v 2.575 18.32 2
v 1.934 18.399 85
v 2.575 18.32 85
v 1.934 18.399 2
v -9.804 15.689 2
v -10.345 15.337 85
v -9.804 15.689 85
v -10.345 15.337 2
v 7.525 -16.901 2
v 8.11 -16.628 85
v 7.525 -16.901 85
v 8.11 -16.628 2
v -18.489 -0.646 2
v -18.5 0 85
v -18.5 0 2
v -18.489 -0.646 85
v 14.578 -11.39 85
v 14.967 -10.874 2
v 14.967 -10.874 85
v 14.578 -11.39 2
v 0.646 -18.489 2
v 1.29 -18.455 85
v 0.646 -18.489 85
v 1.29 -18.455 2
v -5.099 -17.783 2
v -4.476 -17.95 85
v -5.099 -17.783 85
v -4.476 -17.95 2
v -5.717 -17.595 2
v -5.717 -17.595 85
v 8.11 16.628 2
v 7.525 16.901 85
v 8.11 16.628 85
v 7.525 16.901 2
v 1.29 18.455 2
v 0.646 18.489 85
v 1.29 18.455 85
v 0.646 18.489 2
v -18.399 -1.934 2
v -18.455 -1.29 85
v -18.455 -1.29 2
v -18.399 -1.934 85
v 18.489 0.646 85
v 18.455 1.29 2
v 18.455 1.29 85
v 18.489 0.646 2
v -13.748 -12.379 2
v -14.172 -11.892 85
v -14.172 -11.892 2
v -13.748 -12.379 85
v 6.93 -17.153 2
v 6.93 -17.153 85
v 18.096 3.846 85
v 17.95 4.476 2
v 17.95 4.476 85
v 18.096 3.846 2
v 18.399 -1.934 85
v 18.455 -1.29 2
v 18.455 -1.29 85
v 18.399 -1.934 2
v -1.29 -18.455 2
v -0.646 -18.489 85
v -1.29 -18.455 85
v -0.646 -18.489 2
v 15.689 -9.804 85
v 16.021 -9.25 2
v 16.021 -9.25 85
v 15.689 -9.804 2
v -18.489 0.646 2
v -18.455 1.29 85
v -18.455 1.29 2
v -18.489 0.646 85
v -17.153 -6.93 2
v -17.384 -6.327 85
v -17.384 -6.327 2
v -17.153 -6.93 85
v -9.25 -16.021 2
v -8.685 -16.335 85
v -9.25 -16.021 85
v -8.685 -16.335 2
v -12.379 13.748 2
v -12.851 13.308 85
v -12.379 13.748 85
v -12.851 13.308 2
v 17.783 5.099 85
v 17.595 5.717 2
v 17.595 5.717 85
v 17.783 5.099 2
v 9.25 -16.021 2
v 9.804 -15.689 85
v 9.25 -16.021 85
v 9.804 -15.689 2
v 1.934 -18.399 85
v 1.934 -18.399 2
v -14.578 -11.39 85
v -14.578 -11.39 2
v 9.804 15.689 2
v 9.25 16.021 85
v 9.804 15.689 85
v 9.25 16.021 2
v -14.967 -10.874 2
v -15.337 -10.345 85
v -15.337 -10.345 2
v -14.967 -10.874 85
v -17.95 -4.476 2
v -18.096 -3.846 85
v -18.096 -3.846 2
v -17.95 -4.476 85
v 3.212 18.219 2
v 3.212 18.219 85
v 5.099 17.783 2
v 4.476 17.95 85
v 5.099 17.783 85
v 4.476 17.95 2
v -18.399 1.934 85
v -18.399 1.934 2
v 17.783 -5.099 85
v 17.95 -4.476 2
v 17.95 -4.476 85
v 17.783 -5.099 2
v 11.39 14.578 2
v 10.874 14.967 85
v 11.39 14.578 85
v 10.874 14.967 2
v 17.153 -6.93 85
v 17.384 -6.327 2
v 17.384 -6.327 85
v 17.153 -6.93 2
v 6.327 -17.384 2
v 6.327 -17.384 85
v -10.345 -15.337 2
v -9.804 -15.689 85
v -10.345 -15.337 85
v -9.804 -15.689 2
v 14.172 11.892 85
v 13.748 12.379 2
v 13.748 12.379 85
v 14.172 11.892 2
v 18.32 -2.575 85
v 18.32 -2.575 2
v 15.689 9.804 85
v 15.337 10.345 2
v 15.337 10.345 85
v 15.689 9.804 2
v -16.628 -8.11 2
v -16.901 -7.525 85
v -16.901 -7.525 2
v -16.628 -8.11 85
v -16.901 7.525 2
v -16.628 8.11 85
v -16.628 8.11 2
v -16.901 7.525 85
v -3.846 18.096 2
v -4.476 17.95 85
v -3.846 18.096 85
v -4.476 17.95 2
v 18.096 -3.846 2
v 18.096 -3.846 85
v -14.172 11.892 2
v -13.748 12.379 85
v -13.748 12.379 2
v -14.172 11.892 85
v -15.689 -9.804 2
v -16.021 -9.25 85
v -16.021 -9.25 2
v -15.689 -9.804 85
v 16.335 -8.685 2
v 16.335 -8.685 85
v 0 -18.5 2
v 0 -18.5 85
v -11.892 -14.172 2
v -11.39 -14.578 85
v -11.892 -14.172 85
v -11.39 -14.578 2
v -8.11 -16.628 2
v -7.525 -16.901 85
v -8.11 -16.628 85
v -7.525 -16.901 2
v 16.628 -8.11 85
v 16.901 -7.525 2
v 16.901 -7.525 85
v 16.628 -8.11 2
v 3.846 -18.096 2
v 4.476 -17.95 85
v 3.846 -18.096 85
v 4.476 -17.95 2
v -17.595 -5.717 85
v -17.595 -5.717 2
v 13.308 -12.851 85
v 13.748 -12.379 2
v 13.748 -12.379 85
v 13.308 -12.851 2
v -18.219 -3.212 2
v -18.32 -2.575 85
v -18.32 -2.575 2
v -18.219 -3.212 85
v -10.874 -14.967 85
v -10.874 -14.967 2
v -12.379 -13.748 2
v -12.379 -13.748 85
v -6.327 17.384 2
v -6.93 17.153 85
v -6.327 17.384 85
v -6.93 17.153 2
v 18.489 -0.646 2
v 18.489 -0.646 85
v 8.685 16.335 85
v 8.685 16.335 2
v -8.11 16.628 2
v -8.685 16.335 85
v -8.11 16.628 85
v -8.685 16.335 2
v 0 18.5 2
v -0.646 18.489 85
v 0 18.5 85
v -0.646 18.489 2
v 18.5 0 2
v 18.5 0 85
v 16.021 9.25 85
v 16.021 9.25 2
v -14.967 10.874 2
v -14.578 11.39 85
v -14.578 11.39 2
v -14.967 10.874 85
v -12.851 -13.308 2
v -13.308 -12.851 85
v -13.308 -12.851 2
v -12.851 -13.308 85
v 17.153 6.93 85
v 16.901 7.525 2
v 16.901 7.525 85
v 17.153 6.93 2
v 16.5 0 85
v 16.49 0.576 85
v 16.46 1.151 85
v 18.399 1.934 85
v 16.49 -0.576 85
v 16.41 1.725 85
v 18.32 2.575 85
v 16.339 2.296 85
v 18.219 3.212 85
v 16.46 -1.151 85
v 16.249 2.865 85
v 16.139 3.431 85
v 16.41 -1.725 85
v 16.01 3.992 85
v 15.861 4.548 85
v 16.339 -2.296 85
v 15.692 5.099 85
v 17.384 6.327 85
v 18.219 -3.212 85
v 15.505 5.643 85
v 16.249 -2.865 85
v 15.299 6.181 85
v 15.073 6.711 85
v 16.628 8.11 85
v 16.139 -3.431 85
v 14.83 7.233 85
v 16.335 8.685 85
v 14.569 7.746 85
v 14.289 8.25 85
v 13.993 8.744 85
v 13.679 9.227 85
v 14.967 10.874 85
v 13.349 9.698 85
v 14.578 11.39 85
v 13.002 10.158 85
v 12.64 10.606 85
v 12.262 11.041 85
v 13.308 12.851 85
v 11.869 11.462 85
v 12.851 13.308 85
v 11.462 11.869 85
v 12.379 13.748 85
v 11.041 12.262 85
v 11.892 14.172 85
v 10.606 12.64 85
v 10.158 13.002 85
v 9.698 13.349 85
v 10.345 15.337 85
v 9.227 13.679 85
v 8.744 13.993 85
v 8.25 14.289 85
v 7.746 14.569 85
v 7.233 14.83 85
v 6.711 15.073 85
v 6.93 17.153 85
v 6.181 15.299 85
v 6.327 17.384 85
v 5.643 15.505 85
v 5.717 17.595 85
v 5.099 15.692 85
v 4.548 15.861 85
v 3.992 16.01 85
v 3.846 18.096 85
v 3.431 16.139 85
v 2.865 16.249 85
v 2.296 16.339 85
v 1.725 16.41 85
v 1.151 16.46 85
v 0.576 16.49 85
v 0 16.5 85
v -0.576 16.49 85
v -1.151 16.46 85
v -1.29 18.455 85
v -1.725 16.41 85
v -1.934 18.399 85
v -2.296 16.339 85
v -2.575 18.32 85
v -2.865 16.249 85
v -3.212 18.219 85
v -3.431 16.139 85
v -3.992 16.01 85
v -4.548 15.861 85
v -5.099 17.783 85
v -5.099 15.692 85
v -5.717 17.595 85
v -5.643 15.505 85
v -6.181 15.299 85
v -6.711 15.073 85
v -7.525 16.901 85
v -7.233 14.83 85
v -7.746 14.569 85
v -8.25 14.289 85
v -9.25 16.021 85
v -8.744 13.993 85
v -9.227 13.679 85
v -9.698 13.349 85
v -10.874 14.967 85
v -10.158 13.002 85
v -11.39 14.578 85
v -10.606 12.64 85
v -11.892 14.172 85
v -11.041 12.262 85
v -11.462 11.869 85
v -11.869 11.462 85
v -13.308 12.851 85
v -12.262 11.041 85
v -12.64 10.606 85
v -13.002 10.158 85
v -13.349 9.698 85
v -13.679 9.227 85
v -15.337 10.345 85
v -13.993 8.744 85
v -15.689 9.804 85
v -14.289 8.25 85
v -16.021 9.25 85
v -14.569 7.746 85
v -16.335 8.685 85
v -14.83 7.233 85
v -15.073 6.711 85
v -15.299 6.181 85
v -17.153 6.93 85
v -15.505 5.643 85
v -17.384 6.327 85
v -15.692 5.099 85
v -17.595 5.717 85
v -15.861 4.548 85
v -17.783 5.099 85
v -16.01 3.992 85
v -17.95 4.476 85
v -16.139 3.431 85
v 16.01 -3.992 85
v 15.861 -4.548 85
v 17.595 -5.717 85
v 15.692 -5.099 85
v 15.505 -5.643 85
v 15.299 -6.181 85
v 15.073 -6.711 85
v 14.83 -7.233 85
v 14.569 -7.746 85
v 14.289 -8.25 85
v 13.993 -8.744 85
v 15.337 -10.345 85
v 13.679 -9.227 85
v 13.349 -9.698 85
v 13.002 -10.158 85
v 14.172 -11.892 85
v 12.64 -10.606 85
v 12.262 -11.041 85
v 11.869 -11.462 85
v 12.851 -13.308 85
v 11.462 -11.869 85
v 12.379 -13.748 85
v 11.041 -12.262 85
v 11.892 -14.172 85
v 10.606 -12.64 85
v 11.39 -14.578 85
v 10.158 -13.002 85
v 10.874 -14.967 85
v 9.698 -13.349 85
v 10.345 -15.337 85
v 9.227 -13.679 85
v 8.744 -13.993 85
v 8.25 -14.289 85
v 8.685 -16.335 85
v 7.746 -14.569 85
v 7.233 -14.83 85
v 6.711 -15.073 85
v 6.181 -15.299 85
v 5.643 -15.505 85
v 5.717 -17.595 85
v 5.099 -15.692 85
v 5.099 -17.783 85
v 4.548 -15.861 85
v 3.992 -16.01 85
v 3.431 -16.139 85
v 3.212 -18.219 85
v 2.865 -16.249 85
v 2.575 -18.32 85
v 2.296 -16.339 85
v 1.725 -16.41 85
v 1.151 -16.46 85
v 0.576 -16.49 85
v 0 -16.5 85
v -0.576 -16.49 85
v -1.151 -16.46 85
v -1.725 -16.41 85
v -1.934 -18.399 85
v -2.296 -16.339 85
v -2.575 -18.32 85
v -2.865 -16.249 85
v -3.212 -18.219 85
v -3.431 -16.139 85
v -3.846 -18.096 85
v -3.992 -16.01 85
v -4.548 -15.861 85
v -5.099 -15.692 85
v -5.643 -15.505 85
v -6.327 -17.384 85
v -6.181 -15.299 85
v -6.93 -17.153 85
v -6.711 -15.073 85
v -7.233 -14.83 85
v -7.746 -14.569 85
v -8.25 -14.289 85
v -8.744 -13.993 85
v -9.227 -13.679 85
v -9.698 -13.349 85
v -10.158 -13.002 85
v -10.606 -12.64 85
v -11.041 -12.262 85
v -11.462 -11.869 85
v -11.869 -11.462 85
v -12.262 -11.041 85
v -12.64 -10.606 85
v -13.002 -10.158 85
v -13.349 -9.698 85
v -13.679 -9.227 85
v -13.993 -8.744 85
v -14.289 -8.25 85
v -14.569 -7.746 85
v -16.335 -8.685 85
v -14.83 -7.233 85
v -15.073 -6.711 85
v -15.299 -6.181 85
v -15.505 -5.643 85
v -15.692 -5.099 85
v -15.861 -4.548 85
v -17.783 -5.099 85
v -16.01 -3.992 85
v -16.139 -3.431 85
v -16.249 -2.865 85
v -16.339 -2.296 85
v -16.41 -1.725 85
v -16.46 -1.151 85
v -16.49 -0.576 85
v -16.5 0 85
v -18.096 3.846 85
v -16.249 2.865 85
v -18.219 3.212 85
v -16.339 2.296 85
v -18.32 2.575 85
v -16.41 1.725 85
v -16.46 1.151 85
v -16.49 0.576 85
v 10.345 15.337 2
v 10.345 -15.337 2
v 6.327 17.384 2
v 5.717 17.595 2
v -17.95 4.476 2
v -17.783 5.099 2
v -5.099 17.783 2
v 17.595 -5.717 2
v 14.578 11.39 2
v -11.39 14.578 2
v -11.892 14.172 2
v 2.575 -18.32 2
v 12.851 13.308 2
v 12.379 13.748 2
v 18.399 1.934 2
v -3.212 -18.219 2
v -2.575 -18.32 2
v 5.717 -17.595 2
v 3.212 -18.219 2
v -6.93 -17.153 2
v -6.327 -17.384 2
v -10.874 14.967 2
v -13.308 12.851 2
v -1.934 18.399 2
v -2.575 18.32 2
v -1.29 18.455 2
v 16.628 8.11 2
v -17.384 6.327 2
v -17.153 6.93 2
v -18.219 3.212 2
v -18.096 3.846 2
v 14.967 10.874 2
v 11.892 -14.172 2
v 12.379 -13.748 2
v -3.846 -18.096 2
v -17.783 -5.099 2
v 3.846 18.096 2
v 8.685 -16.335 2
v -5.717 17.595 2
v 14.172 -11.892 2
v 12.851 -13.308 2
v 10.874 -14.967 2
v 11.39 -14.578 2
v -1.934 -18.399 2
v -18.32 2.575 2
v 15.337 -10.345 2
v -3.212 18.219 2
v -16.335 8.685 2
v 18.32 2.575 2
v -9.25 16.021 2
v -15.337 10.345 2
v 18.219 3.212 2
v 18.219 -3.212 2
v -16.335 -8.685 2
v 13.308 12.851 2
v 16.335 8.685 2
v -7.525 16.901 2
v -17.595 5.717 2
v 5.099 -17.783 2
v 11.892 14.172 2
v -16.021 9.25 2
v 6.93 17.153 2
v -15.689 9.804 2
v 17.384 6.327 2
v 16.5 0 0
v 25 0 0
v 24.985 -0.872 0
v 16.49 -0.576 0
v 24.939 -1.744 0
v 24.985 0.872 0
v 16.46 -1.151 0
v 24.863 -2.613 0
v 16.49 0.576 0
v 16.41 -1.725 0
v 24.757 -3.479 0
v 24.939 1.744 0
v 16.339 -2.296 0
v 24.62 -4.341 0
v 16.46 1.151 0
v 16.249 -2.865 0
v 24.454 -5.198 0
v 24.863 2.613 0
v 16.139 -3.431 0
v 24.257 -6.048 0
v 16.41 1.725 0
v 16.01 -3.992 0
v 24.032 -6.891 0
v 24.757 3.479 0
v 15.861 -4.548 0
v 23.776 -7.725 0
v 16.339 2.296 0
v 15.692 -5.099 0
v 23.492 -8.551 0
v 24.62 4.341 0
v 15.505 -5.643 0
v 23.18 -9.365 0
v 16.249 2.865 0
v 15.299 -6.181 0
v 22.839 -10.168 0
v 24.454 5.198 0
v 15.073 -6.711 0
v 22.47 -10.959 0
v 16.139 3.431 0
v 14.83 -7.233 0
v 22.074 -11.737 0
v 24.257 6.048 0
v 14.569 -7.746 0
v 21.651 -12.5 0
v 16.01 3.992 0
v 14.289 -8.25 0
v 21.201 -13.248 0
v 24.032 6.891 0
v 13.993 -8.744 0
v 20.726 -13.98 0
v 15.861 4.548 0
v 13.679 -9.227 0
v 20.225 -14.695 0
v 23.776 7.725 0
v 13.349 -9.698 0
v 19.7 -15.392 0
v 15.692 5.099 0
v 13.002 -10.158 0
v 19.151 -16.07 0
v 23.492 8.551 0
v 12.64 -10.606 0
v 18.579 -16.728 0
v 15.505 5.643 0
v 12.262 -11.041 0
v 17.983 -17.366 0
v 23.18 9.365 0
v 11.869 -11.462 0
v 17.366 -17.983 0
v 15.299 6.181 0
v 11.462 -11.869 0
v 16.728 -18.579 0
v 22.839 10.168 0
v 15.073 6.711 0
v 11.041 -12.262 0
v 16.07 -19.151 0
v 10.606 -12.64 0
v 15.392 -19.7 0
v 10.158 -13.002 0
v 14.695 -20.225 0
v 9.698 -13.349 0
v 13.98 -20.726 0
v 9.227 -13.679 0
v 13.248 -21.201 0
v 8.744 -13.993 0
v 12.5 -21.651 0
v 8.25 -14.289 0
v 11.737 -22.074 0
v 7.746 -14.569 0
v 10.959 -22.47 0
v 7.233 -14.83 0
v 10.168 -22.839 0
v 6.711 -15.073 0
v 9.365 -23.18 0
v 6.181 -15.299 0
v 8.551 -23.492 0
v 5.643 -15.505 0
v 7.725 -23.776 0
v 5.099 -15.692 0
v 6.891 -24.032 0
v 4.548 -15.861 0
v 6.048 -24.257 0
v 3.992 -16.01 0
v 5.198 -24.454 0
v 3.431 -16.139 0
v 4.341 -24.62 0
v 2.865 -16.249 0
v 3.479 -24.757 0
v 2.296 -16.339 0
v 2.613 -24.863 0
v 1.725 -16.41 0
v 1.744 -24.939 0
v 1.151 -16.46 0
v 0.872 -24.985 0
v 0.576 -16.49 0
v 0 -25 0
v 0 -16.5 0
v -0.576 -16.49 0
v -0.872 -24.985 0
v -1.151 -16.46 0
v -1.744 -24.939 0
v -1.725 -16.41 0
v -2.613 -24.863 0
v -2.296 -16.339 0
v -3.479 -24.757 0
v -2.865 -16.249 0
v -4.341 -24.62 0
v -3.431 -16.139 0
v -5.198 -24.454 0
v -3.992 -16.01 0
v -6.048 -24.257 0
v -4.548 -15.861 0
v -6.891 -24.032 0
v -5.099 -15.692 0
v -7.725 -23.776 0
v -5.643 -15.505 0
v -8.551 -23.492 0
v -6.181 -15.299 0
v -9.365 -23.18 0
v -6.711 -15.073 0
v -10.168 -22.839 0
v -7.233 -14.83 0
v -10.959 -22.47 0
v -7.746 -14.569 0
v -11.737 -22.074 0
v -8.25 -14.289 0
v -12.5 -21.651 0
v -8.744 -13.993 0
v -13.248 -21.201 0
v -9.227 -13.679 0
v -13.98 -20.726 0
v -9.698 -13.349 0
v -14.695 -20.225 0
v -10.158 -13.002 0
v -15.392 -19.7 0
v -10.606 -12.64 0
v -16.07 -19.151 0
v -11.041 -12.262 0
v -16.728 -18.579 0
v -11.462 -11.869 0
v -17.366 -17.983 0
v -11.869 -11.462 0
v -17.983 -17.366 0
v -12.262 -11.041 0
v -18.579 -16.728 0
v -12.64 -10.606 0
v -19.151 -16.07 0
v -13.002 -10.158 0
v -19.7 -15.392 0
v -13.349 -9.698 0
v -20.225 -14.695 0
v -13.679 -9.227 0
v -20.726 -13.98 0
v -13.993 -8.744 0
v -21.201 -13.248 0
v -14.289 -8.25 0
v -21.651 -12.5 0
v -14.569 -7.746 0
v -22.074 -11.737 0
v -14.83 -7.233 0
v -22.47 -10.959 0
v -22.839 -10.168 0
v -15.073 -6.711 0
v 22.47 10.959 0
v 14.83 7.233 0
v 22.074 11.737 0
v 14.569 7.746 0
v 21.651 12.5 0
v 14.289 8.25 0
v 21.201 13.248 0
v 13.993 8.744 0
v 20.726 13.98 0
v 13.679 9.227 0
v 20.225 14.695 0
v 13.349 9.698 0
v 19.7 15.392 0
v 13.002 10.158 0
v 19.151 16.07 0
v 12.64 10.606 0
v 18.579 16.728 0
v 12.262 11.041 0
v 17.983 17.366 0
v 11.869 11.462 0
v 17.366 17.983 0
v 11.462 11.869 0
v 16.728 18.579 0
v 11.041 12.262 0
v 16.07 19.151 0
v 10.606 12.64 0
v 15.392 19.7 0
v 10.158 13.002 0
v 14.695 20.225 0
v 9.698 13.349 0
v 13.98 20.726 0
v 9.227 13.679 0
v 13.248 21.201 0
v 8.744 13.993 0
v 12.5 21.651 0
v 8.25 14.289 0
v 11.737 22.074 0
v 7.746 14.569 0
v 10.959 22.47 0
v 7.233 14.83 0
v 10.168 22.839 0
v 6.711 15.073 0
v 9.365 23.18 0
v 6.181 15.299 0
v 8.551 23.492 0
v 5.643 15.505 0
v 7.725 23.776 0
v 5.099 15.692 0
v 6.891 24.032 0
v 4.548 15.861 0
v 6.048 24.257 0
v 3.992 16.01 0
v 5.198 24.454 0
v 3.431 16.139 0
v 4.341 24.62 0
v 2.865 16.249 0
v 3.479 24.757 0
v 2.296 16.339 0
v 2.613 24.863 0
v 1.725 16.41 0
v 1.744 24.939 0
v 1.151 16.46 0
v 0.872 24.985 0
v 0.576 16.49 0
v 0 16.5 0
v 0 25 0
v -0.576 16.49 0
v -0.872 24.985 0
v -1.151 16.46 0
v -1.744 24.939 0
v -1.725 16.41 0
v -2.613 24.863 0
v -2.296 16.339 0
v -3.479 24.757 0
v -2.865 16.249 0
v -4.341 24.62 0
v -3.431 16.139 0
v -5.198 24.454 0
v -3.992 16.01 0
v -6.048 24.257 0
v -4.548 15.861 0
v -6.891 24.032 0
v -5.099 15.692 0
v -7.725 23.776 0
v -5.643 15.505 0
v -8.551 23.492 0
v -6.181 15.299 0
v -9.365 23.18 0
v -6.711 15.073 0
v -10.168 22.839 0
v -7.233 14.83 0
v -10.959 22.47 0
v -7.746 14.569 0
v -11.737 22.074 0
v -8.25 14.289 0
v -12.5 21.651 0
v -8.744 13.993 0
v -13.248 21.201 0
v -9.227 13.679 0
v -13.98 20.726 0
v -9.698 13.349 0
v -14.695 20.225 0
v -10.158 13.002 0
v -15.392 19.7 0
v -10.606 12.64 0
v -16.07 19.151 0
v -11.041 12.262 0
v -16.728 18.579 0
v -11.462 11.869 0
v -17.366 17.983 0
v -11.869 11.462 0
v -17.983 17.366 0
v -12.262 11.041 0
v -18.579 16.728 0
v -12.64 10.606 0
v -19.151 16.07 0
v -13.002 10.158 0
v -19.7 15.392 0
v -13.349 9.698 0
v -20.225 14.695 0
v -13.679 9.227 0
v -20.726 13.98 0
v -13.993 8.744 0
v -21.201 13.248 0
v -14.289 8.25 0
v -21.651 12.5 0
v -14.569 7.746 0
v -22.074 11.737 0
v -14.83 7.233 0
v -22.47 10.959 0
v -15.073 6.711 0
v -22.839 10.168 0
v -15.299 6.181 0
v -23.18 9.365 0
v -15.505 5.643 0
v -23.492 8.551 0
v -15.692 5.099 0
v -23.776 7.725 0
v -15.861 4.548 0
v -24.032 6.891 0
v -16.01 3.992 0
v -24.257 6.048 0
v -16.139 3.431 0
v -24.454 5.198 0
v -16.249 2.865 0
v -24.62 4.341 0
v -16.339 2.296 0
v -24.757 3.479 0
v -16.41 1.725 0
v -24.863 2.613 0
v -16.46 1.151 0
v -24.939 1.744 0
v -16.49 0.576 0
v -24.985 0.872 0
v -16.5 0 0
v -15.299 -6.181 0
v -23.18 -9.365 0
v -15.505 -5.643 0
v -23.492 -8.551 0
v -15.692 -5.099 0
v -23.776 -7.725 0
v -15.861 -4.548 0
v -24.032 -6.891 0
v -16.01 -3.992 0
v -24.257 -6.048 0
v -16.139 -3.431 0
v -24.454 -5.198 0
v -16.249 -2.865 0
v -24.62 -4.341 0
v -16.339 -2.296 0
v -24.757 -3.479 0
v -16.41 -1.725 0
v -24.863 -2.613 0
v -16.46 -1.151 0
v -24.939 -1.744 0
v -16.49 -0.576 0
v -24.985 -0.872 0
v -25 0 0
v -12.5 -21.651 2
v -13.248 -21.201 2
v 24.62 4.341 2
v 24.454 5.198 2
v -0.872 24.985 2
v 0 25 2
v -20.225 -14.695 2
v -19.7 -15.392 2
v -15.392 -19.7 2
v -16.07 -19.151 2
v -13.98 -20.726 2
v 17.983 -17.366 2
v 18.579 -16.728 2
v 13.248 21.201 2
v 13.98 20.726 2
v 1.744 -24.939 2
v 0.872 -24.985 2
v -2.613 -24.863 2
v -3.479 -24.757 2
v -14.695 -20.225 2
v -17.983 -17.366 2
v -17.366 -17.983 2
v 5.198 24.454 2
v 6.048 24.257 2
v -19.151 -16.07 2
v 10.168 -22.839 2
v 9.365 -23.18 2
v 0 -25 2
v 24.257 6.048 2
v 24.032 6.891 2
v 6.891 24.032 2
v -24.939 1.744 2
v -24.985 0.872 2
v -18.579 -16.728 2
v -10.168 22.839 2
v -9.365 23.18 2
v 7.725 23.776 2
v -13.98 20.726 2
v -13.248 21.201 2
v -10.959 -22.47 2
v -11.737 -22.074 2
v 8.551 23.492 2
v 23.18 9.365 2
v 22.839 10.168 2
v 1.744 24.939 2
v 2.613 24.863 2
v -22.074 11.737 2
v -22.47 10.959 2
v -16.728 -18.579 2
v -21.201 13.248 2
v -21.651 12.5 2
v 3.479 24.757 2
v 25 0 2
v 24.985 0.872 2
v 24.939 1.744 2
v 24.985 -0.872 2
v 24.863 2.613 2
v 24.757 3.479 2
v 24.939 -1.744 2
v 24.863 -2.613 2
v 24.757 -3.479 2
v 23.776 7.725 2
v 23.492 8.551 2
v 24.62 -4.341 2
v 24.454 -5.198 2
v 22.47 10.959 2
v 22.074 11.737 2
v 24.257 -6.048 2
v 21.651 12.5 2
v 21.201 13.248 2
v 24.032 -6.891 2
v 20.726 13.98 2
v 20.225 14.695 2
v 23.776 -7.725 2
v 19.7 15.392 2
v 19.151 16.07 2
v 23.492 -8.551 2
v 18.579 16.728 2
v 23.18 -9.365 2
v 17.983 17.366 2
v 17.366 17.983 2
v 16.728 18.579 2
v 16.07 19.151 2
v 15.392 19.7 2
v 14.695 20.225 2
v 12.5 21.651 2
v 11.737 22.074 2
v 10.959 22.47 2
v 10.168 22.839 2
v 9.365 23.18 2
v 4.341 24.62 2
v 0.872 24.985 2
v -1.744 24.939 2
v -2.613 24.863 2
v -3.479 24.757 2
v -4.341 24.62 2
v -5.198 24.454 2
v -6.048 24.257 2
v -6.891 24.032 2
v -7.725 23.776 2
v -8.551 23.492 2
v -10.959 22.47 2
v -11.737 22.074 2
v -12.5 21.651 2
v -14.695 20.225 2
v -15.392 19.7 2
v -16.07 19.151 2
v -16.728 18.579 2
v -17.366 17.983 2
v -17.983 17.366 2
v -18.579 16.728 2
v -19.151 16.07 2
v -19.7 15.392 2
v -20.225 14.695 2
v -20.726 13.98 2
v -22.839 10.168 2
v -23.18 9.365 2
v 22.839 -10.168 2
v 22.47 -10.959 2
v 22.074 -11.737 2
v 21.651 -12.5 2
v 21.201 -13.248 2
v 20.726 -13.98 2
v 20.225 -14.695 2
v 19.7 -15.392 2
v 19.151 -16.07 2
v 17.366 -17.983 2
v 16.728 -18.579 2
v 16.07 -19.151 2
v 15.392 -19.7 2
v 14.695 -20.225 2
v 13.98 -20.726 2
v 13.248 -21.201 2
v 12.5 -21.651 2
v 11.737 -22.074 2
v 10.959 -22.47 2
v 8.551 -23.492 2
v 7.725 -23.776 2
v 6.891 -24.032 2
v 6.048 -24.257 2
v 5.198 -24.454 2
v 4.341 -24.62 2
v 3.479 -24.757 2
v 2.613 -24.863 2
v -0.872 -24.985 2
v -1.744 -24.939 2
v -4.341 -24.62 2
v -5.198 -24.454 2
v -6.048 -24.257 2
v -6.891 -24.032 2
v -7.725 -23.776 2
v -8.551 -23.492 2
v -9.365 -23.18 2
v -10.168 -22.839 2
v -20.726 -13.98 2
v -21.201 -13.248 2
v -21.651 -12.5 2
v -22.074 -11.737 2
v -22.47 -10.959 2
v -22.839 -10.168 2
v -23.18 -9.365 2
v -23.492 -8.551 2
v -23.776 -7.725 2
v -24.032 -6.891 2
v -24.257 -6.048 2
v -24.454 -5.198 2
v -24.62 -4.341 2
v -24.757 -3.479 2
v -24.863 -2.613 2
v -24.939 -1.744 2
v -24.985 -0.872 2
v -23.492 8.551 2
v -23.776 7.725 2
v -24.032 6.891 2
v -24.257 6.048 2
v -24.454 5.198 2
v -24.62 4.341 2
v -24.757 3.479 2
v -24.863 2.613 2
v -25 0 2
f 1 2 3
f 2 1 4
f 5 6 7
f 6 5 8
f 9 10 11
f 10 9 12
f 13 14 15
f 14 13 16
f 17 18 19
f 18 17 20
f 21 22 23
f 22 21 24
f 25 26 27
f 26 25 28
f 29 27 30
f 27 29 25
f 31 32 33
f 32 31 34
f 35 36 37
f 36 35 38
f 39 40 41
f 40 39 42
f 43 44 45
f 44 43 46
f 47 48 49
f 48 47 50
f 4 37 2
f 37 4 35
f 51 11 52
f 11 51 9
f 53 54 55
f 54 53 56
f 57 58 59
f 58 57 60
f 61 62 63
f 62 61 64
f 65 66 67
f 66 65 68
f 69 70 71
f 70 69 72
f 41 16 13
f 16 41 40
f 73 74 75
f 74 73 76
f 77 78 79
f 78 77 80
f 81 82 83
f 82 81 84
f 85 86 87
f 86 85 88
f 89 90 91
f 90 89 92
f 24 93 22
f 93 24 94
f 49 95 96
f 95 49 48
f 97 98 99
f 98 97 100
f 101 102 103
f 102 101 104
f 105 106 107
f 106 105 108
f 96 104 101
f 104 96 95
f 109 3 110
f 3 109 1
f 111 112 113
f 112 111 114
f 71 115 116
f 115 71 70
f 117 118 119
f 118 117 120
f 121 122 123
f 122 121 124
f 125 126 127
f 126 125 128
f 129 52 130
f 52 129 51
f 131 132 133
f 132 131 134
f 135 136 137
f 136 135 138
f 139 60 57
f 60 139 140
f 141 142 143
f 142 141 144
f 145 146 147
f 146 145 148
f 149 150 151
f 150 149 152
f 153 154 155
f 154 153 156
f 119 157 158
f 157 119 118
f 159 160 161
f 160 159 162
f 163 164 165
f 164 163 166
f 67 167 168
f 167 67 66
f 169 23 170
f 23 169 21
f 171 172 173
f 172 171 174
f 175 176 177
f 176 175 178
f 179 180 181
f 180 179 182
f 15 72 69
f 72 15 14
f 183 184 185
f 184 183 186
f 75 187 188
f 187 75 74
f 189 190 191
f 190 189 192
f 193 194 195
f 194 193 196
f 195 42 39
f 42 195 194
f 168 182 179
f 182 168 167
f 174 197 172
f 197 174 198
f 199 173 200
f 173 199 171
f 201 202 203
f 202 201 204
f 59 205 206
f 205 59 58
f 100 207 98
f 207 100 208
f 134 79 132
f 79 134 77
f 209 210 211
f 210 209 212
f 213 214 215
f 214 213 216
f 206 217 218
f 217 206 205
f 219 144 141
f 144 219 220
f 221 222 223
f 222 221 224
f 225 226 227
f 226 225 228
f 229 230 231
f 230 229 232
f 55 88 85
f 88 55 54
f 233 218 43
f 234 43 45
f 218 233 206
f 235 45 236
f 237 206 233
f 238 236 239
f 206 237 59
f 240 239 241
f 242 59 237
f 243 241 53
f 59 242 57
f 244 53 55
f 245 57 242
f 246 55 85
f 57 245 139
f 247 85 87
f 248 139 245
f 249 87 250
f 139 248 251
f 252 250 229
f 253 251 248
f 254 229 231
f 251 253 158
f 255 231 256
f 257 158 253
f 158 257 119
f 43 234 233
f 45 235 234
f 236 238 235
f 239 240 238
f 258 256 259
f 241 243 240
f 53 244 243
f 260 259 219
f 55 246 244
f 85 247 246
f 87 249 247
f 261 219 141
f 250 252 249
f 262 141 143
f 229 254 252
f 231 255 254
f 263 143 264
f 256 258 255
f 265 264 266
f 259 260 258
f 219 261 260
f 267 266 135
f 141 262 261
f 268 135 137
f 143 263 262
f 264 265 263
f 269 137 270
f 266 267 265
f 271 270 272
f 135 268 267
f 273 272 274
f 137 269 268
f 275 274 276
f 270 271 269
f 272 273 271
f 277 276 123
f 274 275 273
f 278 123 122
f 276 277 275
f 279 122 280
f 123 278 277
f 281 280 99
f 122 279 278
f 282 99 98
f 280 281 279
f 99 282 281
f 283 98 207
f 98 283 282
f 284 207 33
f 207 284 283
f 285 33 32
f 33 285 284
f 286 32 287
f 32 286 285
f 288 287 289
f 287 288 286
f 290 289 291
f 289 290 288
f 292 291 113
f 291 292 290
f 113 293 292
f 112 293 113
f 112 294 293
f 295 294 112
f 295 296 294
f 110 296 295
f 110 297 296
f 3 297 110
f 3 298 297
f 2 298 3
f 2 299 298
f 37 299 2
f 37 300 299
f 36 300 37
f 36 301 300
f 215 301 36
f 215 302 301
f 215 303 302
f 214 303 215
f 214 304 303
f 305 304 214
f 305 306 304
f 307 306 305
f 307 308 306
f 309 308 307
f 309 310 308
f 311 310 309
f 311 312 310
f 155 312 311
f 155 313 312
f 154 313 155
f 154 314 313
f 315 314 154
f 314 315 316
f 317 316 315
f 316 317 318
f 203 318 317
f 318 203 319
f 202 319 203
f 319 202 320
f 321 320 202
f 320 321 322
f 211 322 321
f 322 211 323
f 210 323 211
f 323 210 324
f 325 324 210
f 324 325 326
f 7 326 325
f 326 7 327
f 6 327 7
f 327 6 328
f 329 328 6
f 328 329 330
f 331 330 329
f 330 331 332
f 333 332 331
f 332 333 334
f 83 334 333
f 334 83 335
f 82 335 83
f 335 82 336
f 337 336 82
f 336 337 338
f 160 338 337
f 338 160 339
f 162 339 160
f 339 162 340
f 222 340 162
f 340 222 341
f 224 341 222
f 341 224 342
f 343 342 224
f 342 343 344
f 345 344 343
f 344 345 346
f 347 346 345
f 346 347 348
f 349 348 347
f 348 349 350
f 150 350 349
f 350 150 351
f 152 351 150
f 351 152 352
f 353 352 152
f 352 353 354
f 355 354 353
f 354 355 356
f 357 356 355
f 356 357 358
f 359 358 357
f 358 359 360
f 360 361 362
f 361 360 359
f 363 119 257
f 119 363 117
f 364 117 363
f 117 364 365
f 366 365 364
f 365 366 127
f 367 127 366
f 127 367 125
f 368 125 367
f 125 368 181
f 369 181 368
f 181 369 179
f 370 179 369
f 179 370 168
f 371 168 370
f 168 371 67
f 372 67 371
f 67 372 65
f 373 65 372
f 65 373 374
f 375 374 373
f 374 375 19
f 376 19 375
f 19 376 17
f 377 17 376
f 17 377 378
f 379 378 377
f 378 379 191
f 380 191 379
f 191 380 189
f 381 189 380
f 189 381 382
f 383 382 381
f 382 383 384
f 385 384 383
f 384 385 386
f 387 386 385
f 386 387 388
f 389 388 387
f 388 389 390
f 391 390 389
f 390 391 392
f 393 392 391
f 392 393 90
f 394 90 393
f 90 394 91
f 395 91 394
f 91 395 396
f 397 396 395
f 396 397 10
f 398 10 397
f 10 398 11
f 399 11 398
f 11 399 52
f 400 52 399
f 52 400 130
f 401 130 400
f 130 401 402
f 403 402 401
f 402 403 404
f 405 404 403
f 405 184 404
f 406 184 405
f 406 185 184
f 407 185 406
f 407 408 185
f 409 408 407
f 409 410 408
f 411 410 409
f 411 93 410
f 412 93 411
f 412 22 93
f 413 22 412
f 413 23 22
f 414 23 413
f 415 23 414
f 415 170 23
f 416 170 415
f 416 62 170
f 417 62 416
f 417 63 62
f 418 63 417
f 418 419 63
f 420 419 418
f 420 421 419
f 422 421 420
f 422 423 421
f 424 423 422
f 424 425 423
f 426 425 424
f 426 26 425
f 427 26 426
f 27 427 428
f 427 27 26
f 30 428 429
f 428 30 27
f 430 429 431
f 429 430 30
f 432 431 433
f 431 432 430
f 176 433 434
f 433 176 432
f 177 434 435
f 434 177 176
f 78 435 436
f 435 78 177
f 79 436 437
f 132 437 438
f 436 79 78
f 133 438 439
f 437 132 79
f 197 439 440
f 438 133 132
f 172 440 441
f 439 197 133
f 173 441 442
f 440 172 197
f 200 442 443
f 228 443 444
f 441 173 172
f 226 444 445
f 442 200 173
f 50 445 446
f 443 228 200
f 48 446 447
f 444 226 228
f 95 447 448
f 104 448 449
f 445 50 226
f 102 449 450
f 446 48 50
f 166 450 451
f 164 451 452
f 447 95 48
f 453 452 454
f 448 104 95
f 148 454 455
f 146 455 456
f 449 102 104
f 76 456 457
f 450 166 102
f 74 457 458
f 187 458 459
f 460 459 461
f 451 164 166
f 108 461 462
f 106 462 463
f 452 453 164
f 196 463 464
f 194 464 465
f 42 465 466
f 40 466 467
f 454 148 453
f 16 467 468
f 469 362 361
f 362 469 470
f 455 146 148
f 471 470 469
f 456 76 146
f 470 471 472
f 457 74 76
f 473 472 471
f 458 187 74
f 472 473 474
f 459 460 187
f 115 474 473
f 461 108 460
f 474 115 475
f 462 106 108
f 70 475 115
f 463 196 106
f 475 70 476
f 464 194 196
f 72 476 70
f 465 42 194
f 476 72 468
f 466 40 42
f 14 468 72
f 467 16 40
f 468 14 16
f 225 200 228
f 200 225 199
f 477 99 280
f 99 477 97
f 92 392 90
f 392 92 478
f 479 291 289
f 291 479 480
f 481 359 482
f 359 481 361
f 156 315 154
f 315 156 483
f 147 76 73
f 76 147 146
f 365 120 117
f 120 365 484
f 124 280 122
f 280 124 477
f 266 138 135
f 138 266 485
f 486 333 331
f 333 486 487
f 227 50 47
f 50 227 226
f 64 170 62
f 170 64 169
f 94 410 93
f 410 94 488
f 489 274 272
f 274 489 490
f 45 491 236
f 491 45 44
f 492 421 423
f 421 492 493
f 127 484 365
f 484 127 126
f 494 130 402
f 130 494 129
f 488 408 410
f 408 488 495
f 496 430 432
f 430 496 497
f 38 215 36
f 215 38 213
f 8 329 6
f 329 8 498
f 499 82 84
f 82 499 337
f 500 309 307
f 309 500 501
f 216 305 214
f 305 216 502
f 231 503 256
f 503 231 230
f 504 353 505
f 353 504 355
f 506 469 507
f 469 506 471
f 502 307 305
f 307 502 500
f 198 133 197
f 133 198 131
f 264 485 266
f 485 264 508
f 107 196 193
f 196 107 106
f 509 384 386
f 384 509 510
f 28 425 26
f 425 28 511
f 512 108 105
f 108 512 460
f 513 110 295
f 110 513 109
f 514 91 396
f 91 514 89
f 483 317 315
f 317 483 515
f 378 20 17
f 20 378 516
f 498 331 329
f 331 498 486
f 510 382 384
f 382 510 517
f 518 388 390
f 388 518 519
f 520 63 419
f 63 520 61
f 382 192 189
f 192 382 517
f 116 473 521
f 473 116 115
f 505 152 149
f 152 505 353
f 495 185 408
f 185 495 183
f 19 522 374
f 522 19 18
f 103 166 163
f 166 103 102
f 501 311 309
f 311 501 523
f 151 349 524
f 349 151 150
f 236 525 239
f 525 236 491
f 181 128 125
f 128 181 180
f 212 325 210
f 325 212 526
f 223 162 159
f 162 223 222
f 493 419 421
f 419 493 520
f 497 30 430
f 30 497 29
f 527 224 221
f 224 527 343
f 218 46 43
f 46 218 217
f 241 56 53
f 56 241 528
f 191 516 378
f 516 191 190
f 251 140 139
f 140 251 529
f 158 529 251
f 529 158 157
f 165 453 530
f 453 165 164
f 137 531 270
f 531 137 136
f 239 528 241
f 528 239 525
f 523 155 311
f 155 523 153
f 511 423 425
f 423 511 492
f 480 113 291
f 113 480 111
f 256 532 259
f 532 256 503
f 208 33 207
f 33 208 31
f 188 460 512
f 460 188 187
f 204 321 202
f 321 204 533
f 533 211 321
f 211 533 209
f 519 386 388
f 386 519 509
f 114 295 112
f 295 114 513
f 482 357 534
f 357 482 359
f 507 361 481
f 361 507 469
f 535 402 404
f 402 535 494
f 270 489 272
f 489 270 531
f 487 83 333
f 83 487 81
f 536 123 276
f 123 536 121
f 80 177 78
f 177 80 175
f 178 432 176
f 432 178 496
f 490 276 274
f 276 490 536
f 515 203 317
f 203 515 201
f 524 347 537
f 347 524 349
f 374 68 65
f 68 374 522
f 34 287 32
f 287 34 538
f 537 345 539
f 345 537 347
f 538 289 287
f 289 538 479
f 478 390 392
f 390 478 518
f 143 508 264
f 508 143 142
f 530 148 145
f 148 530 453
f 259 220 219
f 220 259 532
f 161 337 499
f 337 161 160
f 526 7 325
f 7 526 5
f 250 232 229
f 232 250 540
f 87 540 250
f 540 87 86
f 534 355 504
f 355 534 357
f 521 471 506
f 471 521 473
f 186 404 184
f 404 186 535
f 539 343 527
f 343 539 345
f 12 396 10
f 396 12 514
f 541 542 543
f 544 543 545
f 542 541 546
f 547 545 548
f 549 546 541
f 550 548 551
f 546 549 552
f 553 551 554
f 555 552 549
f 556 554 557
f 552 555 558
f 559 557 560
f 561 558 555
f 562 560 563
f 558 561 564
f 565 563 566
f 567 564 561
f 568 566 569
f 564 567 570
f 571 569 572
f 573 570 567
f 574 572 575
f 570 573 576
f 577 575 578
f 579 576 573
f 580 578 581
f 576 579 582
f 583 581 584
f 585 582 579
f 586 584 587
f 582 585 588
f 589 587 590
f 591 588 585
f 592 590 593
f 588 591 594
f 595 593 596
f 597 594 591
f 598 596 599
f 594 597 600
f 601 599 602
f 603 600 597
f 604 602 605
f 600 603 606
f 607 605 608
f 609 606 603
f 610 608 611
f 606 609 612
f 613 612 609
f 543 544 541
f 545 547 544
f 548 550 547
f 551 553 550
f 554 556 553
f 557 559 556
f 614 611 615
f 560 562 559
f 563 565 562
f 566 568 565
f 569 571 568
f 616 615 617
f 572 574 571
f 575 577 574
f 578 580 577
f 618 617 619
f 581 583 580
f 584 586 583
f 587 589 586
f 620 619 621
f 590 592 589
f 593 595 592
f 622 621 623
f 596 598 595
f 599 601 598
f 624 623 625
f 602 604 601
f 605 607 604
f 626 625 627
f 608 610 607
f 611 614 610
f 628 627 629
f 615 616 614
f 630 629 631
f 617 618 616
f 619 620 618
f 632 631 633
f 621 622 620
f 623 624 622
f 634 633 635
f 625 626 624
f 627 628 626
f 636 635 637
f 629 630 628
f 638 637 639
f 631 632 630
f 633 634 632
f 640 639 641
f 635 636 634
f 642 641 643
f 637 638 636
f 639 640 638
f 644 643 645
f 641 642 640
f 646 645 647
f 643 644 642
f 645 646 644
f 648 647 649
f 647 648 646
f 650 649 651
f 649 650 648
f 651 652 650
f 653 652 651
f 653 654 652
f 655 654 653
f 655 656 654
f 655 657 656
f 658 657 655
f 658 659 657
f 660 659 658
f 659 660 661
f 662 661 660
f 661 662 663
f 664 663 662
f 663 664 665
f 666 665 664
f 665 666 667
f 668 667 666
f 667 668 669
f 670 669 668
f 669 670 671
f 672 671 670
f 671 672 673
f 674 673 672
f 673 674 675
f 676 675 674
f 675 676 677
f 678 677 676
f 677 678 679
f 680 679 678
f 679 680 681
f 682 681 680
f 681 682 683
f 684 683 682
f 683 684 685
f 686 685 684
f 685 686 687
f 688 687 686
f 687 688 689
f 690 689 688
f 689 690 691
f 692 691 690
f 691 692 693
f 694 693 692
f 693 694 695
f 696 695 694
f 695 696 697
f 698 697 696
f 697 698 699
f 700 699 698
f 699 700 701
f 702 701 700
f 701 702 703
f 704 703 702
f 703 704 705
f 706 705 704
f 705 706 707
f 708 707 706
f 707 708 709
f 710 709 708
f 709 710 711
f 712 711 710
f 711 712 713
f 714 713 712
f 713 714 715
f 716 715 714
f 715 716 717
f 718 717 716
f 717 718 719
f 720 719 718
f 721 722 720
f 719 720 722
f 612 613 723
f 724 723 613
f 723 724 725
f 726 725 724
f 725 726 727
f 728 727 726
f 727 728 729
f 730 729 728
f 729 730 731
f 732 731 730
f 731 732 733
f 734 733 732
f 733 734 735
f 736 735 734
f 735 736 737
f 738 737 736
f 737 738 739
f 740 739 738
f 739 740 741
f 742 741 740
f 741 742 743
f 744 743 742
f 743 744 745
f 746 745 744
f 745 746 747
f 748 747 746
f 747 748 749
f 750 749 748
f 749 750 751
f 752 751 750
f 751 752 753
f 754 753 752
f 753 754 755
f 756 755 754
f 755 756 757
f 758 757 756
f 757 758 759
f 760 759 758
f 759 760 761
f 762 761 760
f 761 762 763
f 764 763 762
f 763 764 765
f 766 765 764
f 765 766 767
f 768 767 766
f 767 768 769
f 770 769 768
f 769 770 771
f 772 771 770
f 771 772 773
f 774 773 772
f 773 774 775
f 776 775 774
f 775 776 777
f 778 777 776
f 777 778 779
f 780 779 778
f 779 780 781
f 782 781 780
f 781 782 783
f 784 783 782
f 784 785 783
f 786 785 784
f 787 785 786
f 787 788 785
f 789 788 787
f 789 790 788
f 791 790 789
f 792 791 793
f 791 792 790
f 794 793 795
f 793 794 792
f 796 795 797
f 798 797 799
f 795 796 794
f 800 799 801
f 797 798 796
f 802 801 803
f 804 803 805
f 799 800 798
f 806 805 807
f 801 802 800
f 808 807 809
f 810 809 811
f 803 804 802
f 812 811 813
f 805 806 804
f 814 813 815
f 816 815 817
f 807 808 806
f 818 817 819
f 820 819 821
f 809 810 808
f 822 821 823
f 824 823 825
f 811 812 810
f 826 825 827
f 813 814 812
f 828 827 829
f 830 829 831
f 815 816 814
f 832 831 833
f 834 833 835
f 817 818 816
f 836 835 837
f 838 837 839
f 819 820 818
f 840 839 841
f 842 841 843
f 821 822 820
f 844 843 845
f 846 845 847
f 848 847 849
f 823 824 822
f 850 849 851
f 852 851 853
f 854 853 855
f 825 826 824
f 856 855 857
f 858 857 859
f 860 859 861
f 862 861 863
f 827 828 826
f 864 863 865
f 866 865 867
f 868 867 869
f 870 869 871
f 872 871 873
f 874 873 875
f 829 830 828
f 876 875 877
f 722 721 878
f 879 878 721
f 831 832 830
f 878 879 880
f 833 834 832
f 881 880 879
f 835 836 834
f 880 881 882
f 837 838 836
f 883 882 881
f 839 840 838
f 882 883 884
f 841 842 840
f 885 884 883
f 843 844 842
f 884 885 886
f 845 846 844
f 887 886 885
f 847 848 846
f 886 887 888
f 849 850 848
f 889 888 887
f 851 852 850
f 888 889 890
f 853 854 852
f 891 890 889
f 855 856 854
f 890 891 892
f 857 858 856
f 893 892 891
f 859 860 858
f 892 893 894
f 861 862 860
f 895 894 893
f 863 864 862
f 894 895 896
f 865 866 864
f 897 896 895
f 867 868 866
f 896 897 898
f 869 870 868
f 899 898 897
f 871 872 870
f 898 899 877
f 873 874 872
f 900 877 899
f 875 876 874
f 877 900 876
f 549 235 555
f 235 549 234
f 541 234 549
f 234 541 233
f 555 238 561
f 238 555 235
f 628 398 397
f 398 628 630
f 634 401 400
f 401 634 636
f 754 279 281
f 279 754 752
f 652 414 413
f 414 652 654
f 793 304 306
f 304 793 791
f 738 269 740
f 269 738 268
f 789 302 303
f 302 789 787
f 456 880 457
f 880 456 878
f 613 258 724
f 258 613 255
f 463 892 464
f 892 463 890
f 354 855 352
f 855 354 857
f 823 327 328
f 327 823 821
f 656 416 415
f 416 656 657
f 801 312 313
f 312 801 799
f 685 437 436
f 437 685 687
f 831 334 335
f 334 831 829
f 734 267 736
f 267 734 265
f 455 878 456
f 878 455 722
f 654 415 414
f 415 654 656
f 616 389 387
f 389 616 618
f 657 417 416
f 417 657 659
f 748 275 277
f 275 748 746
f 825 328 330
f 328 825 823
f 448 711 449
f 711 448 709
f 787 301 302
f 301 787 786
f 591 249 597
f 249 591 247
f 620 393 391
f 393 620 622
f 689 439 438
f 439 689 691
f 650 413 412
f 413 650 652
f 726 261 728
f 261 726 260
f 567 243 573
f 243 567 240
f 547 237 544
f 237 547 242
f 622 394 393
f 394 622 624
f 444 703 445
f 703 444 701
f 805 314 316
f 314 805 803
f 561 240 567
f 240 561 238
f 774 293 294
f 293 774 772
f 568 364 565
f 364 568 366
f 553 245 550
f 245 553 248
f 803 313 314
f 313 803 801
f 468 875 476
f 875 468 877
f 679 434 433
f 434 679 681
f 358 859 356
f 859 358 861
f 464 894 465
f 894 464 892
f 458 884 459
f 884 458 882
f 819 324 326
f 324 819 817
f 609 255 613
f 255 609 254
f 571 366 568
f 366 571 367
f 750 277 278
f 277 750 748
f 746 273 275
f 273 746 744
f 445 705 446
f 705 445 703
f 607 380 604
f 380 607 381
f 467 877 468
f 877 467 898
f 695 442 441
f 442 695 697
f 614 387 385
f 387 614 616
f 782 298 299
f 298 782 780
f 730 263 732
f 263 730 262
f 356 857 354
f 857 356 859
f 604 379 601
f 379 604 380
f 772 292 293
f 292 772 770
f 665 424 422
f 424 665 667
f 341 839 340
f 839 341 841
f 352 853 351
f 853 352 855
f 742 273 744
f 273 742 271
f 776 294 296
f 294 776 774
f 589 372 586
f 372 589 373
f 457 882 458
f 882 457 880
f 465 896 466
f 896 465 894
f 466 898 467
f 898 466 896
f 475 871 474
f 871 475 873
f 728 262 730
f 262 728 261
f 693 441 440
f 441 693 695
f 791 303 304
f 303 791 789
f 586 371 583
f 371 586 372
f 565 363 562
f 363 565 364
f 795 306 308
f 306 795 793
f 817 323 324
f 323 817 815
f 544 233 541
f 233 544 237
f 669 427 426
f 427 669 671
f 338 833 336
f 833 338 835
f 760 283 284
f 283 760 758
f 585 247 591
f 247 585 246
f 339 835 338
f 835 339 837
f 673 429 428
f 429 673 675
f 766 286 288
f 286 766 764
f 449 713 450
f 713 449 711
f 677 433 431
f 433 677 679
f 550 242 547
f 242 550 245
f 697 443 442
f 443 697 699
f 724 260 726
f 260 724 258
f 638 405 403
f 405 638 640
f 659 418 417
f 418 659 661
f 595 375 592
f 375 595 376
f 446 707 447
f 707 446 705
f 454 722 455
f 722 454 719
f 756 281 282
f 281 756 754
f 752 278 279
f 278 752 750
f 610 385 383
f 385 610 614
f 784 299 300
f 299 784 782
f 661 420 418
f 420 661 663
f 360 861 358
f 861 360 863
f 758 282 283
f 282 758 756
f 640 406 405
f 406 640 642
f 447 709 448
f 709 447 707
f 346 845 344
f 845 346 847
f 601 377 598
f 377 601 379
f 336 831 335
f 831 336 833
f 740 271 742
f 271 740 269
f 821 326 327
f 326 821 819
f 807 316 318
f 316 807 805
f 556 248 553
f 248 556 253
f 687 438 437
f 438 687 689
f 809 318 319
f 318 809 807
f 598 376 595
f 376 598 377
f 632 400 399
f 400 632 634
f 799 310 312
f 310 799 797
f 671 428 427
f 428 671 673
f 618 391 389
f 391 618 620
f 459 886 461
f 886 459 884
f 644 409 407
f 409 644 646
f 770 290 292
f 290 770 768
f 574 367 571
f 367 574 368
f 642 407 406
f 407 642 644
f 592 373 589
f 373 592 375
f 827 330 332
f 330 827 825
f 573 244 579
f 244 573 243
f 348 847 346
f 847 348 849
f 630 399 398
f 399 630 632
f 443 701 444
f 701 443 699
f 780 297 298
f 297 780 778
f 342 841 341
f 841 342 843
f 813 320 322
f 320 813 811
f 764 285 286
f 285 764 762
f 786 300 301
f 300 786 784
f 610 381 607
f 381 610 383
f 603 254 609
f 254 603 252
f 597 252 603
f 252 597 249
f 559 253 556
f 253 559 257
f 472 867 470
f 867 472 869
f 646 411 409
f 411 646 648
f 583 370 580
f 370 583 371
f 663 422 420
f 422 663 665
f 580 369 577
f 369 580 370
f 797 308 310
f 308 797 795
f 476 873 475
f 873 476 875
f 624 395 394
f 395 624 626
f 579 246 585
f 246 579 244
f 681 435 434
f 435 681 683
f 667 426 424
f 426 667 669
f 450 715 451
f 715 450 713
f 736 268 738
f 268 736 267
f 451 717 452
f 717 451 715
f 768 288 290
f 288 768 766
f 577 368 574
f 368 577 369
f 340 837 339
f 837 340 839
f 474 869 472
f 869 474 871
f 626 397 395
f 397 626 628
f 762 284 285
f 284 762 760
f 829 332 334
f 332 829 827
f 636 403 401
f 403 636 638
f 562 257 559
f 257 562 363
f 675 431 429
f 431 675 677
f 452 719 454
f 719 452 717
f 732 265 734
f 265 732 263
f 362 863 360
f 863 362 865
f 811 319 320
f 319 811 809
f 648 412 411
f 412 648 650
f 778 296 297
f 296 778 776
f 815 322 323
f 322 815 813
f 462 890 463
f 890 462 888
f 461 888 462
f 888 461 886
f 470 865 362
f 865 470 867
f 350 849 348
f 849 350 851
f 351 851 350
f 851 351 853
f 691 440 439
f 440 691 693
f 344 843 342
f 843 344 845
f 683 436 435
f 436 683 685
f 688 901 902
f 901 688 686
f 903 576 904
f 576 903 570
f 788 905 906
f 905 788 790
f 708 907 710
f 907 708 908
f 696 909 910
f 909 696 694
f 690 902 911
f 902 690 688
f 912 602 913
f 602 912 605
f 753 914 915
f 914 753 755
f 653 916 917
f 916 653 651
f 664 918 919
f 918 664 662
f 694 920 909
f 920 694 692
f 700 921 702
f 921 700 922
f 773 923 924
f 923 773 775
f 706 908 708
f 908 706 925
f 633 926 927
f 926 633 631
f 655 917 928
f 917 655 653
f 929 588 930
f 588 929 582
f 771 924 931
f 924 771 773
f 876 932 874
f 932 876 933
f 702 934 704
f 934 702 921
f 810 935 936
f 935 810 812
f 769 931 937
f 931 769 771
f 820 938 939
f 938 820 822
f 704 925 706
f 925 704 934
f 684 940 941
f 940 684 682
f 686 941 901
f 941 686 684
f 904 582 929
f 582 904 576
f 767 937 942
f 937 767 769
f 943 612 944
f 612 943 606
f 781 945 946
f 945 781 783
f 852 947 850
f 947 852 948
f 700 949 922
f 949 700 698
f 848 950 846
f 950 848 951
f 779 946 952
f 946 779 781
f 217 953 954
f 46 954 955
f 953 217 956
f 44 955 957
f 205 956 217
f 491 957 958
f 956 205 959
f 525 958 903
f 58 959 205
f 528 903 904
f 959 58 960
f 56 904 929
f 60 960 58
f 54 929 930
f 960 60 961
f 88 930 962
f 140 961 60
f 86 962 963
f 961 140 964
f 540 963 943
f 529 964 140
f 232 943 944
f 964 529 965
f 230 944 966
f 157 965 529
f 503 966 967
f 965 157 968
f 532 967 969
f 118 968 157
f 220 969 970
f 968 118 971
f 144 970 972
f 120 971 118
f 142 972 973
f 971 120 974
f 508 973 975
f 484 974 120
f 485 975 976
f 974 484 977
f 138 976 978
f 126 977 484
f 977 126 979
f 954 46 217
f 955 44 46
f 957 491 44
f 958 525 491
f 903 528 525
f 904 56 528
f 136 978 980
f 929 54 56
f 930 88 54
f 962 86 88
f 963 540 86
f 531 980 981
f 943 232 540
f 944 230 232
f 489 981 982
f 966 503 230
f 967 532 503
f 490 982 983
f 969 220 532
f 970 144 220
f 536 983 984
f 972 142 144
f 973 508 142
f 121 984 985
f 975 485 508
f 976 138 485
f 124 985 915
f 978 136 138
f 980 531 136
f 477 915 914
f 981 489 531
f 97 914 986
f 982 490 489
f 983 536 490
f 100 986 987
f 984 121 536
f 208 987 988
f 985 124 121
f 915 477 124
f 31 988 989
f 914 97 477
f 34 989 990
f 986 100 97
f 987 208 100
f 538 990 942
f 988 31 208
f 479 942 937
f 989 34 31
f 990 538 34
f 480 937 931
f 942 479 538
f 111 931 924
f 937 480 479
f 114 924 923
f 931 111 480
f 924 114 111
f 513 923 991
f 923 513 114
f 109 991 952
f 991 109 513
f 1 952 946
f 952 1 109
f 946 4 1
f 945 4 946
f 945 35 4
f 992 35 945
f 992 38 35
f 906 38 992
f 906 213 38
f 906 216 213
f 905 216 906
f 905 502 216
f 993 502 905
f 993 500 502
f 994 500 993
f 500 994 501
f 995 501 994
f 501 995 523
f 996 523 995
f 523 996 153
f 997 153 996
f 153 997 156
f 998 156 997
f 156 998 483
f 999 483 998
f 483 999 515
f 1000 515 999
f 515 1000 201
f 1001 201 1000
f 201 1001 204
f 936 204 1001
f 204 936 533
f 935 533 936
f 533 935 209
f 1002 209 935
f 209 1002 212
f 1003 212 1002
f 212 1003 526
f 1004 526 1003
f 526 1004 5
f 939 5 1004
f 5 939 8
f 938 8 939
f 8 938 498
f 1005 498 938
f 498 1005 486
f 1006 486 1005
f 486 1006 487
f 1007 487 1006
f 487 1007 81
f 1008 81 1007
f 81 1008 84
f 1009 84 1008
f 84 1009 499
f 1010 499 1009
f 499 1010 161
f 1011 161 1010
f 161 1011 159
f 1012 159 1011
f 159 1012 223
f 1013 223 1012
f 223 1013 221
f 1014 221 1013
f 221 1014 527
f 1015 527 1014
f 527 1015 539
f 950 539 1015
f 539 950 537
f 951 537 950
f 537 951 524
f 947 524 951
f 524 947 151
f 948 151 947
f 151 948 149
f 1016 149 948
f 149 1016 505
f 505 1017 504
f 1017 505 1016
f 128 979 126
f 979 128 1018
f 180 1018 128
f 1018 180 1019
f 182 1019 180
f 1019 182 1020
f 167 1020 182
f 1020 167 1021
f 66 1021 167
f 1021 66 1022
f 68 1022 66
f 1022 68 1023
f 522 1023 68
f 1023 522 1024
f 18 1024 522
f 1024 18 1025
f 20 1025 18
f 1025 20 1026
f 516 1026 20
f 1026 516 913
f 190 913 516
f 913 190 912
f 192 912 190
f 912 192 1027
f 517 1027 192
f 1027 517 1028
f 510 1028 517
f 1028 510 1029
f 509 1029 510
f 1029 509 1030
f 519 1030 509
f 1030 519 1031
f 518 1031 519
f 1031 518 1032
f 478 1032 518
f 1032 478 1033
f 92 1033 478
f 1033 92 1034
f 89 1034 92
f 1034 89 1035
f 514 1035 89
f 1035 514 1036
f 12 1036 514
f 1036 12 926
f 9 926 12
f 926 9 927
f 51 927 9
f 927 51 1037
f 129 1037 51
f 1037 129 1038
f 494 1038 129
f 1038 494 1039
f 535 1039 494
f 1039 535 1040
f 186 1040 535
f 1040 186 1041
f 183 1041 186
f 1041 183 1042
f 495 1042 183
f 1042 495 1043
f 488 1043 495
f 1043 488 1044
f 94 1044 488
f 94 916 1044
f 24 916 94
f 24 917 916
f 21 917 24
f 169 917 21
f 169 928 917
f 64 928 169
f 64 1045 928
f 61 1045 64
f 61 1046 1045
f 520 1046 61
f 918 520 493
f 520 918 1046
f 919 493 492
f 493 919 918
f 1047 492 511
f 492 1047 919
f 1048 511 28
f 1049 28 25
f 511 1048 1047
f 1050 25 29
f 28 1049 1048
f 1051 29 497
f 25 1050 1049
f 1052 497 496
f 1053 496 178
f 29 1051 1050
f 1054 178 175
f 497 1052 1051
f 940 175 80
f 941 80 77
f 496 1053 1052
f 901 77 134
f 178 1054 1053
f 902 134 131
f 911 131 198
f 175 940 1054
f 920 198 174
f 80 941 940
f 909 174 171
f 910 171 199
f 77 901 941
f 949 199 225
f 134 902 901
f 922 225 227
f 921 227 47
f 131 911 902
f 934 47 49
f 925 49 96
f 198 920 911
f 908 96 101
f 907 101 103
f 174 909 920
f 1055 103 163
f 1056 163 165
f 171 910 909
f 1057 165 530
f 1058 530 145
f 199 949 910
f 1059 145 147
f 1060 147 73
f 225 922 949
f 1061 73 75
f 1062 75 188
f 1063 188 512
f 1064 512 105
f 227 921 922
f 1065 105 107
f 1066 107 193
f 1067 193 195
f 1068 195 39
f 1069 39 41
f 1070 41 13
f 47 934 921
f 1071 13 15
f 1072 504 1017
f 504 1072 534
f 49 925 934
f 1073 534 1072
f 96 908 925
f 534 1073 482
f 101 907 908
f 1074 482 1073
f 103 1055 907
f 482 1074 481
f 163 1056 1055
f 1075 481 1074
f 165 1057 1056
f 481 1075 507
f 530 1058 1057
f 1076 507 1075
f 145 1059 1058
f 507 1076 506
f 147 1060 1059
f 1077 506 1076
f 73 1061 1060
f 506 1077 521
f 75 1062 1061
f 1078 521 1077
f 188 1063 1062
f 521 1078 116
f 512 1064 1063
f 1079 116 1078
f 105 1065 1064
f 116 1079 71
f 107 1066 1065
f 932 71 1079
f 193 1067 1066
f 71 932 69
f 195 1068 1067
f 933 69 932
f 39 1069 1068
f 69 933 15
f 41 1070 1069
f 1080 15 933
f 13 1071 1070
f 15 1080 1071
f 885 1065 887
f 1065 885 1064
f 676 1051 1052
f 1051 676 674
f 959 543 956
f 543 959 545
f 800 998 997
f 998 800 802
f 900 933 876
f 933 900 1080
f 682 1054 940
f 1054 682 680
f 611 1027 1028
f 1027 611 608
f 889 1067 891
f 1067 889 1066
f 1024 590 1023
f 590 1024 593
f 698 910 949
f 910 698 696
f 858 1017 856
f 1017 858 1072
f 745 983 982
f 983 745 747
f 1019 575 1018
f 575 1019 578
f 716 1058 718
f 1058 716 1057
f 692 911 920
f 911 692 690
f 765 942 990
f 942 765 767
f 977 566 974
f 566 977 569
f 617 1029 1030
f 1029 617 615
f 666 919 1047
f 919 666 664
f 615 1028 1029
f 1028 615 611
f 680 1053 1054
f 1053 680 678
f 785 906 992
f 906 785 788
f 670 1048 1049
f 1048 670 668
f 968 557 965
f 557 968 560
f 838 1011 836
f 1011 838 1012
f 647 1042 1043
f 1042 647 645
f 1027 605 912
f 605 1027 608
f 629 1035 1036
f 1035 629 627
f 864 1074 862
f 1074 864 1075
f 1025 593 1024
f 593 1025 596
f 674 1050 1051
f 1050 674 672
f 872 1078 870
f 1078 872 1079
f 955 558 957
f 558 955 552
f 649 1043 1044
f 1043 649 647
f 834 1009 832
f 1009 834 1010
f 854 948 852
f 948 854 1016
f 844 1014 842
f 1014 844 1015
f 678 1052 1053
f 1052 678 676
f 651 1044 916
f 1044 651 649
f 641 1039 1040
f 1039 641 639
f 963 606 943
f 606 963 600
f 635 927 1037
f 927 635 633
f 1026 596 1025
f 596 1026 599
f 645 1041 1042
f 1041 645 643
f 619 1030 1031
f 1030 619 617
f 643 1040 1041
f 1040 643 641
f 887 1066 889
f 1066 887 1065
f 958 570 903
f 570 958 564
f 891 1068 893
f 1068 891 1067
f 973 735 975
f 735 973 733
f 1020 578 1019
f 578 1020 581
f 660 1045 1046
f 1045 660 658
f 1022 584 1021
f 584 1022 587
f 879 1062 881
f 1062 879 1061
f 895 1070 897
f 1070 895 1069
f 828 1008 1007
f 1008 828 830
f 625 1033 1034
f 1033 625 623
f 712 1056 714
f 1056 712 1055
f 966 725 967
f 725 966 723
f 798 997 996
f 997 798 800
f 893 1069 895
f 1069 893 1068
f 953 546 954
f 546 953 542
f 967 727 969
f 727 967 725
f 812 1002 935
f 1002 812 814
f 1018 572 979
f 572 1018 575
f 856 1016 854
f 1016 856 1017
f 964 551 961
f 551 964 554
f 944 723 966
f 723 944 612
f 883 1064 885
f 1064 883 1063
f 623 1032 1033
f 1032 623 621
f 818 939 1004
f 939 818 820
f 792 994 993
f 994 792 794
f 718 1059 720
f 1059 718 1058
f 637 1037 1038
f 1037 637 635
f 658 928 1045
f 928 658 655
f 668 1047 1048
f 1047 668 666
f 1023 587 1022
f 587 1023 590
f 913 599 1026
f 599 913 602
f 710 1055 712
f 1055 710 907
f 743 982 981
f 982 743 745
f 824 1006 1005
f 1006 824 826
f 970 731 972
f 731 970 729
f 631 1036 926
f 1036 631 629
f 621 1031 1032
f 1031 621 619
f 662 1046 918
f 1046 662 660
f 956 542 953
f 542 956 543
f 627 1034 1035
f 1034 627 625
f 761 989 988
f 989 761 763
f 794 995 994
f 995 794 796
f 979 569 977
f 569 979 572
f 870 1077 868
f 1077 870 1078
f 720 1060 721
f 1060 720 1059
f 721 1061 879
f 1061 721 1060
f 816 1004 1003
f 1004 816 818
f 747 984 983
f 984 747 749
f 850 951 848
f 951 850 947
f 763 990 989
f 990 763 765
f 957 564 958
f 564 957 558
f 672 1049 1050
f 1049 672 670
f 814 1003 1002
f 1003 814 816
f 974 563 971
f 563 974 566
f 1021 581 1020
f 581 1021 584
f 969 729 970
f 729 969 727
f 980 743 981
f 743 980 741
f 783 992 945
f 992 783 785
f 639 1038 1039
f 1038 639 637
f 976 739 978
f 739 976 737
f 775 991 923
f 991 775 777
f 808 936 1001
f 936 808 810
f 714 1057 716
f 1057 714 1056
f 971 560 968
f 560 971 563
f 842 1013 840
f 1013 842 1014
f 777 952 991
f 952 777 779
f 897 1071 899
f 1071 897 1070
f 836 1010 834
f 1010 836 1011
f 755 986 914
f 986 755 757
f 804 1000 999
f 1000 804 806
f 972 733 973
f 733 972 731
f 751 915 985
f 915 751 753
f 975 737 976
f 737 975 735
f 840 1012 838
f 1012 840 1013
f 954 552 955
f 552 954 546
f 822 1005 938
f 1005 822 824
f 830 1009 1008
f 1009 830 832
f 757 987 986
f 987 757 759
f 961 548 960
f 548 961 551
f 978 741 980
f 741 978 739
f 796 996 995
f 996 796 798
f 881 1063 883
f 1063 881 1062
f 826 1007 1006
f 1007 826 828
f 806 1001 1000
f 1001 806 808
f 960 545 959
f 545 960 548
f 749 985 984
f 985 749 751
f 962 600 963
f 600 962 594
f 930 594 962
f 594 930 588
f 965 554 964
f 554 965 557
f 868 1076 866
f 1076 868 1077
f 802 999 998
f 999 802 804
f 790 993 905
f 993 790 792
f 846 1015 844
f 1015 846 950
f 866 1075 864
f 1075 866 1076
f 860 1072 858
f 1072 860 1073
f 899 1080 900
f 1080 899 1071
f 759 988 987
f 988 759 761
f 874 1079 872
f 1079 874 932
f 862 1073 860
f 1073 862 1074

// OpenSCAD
// Copyright 2024 Heikki Suonsivu
// Licensed under Creative Commons CC-BY-NC-SA, see https://creativecommons.org/licenses/by-nc-sa/4.0/
// For commercial licensing, please contact directly, hsu-3d@suonsivu.net, +358 40 551 9679

include <hsu.scad>

wall=2;
ring(37,wall,85,0,180);
ring(50,(50-37)/2,wall,0,180);
